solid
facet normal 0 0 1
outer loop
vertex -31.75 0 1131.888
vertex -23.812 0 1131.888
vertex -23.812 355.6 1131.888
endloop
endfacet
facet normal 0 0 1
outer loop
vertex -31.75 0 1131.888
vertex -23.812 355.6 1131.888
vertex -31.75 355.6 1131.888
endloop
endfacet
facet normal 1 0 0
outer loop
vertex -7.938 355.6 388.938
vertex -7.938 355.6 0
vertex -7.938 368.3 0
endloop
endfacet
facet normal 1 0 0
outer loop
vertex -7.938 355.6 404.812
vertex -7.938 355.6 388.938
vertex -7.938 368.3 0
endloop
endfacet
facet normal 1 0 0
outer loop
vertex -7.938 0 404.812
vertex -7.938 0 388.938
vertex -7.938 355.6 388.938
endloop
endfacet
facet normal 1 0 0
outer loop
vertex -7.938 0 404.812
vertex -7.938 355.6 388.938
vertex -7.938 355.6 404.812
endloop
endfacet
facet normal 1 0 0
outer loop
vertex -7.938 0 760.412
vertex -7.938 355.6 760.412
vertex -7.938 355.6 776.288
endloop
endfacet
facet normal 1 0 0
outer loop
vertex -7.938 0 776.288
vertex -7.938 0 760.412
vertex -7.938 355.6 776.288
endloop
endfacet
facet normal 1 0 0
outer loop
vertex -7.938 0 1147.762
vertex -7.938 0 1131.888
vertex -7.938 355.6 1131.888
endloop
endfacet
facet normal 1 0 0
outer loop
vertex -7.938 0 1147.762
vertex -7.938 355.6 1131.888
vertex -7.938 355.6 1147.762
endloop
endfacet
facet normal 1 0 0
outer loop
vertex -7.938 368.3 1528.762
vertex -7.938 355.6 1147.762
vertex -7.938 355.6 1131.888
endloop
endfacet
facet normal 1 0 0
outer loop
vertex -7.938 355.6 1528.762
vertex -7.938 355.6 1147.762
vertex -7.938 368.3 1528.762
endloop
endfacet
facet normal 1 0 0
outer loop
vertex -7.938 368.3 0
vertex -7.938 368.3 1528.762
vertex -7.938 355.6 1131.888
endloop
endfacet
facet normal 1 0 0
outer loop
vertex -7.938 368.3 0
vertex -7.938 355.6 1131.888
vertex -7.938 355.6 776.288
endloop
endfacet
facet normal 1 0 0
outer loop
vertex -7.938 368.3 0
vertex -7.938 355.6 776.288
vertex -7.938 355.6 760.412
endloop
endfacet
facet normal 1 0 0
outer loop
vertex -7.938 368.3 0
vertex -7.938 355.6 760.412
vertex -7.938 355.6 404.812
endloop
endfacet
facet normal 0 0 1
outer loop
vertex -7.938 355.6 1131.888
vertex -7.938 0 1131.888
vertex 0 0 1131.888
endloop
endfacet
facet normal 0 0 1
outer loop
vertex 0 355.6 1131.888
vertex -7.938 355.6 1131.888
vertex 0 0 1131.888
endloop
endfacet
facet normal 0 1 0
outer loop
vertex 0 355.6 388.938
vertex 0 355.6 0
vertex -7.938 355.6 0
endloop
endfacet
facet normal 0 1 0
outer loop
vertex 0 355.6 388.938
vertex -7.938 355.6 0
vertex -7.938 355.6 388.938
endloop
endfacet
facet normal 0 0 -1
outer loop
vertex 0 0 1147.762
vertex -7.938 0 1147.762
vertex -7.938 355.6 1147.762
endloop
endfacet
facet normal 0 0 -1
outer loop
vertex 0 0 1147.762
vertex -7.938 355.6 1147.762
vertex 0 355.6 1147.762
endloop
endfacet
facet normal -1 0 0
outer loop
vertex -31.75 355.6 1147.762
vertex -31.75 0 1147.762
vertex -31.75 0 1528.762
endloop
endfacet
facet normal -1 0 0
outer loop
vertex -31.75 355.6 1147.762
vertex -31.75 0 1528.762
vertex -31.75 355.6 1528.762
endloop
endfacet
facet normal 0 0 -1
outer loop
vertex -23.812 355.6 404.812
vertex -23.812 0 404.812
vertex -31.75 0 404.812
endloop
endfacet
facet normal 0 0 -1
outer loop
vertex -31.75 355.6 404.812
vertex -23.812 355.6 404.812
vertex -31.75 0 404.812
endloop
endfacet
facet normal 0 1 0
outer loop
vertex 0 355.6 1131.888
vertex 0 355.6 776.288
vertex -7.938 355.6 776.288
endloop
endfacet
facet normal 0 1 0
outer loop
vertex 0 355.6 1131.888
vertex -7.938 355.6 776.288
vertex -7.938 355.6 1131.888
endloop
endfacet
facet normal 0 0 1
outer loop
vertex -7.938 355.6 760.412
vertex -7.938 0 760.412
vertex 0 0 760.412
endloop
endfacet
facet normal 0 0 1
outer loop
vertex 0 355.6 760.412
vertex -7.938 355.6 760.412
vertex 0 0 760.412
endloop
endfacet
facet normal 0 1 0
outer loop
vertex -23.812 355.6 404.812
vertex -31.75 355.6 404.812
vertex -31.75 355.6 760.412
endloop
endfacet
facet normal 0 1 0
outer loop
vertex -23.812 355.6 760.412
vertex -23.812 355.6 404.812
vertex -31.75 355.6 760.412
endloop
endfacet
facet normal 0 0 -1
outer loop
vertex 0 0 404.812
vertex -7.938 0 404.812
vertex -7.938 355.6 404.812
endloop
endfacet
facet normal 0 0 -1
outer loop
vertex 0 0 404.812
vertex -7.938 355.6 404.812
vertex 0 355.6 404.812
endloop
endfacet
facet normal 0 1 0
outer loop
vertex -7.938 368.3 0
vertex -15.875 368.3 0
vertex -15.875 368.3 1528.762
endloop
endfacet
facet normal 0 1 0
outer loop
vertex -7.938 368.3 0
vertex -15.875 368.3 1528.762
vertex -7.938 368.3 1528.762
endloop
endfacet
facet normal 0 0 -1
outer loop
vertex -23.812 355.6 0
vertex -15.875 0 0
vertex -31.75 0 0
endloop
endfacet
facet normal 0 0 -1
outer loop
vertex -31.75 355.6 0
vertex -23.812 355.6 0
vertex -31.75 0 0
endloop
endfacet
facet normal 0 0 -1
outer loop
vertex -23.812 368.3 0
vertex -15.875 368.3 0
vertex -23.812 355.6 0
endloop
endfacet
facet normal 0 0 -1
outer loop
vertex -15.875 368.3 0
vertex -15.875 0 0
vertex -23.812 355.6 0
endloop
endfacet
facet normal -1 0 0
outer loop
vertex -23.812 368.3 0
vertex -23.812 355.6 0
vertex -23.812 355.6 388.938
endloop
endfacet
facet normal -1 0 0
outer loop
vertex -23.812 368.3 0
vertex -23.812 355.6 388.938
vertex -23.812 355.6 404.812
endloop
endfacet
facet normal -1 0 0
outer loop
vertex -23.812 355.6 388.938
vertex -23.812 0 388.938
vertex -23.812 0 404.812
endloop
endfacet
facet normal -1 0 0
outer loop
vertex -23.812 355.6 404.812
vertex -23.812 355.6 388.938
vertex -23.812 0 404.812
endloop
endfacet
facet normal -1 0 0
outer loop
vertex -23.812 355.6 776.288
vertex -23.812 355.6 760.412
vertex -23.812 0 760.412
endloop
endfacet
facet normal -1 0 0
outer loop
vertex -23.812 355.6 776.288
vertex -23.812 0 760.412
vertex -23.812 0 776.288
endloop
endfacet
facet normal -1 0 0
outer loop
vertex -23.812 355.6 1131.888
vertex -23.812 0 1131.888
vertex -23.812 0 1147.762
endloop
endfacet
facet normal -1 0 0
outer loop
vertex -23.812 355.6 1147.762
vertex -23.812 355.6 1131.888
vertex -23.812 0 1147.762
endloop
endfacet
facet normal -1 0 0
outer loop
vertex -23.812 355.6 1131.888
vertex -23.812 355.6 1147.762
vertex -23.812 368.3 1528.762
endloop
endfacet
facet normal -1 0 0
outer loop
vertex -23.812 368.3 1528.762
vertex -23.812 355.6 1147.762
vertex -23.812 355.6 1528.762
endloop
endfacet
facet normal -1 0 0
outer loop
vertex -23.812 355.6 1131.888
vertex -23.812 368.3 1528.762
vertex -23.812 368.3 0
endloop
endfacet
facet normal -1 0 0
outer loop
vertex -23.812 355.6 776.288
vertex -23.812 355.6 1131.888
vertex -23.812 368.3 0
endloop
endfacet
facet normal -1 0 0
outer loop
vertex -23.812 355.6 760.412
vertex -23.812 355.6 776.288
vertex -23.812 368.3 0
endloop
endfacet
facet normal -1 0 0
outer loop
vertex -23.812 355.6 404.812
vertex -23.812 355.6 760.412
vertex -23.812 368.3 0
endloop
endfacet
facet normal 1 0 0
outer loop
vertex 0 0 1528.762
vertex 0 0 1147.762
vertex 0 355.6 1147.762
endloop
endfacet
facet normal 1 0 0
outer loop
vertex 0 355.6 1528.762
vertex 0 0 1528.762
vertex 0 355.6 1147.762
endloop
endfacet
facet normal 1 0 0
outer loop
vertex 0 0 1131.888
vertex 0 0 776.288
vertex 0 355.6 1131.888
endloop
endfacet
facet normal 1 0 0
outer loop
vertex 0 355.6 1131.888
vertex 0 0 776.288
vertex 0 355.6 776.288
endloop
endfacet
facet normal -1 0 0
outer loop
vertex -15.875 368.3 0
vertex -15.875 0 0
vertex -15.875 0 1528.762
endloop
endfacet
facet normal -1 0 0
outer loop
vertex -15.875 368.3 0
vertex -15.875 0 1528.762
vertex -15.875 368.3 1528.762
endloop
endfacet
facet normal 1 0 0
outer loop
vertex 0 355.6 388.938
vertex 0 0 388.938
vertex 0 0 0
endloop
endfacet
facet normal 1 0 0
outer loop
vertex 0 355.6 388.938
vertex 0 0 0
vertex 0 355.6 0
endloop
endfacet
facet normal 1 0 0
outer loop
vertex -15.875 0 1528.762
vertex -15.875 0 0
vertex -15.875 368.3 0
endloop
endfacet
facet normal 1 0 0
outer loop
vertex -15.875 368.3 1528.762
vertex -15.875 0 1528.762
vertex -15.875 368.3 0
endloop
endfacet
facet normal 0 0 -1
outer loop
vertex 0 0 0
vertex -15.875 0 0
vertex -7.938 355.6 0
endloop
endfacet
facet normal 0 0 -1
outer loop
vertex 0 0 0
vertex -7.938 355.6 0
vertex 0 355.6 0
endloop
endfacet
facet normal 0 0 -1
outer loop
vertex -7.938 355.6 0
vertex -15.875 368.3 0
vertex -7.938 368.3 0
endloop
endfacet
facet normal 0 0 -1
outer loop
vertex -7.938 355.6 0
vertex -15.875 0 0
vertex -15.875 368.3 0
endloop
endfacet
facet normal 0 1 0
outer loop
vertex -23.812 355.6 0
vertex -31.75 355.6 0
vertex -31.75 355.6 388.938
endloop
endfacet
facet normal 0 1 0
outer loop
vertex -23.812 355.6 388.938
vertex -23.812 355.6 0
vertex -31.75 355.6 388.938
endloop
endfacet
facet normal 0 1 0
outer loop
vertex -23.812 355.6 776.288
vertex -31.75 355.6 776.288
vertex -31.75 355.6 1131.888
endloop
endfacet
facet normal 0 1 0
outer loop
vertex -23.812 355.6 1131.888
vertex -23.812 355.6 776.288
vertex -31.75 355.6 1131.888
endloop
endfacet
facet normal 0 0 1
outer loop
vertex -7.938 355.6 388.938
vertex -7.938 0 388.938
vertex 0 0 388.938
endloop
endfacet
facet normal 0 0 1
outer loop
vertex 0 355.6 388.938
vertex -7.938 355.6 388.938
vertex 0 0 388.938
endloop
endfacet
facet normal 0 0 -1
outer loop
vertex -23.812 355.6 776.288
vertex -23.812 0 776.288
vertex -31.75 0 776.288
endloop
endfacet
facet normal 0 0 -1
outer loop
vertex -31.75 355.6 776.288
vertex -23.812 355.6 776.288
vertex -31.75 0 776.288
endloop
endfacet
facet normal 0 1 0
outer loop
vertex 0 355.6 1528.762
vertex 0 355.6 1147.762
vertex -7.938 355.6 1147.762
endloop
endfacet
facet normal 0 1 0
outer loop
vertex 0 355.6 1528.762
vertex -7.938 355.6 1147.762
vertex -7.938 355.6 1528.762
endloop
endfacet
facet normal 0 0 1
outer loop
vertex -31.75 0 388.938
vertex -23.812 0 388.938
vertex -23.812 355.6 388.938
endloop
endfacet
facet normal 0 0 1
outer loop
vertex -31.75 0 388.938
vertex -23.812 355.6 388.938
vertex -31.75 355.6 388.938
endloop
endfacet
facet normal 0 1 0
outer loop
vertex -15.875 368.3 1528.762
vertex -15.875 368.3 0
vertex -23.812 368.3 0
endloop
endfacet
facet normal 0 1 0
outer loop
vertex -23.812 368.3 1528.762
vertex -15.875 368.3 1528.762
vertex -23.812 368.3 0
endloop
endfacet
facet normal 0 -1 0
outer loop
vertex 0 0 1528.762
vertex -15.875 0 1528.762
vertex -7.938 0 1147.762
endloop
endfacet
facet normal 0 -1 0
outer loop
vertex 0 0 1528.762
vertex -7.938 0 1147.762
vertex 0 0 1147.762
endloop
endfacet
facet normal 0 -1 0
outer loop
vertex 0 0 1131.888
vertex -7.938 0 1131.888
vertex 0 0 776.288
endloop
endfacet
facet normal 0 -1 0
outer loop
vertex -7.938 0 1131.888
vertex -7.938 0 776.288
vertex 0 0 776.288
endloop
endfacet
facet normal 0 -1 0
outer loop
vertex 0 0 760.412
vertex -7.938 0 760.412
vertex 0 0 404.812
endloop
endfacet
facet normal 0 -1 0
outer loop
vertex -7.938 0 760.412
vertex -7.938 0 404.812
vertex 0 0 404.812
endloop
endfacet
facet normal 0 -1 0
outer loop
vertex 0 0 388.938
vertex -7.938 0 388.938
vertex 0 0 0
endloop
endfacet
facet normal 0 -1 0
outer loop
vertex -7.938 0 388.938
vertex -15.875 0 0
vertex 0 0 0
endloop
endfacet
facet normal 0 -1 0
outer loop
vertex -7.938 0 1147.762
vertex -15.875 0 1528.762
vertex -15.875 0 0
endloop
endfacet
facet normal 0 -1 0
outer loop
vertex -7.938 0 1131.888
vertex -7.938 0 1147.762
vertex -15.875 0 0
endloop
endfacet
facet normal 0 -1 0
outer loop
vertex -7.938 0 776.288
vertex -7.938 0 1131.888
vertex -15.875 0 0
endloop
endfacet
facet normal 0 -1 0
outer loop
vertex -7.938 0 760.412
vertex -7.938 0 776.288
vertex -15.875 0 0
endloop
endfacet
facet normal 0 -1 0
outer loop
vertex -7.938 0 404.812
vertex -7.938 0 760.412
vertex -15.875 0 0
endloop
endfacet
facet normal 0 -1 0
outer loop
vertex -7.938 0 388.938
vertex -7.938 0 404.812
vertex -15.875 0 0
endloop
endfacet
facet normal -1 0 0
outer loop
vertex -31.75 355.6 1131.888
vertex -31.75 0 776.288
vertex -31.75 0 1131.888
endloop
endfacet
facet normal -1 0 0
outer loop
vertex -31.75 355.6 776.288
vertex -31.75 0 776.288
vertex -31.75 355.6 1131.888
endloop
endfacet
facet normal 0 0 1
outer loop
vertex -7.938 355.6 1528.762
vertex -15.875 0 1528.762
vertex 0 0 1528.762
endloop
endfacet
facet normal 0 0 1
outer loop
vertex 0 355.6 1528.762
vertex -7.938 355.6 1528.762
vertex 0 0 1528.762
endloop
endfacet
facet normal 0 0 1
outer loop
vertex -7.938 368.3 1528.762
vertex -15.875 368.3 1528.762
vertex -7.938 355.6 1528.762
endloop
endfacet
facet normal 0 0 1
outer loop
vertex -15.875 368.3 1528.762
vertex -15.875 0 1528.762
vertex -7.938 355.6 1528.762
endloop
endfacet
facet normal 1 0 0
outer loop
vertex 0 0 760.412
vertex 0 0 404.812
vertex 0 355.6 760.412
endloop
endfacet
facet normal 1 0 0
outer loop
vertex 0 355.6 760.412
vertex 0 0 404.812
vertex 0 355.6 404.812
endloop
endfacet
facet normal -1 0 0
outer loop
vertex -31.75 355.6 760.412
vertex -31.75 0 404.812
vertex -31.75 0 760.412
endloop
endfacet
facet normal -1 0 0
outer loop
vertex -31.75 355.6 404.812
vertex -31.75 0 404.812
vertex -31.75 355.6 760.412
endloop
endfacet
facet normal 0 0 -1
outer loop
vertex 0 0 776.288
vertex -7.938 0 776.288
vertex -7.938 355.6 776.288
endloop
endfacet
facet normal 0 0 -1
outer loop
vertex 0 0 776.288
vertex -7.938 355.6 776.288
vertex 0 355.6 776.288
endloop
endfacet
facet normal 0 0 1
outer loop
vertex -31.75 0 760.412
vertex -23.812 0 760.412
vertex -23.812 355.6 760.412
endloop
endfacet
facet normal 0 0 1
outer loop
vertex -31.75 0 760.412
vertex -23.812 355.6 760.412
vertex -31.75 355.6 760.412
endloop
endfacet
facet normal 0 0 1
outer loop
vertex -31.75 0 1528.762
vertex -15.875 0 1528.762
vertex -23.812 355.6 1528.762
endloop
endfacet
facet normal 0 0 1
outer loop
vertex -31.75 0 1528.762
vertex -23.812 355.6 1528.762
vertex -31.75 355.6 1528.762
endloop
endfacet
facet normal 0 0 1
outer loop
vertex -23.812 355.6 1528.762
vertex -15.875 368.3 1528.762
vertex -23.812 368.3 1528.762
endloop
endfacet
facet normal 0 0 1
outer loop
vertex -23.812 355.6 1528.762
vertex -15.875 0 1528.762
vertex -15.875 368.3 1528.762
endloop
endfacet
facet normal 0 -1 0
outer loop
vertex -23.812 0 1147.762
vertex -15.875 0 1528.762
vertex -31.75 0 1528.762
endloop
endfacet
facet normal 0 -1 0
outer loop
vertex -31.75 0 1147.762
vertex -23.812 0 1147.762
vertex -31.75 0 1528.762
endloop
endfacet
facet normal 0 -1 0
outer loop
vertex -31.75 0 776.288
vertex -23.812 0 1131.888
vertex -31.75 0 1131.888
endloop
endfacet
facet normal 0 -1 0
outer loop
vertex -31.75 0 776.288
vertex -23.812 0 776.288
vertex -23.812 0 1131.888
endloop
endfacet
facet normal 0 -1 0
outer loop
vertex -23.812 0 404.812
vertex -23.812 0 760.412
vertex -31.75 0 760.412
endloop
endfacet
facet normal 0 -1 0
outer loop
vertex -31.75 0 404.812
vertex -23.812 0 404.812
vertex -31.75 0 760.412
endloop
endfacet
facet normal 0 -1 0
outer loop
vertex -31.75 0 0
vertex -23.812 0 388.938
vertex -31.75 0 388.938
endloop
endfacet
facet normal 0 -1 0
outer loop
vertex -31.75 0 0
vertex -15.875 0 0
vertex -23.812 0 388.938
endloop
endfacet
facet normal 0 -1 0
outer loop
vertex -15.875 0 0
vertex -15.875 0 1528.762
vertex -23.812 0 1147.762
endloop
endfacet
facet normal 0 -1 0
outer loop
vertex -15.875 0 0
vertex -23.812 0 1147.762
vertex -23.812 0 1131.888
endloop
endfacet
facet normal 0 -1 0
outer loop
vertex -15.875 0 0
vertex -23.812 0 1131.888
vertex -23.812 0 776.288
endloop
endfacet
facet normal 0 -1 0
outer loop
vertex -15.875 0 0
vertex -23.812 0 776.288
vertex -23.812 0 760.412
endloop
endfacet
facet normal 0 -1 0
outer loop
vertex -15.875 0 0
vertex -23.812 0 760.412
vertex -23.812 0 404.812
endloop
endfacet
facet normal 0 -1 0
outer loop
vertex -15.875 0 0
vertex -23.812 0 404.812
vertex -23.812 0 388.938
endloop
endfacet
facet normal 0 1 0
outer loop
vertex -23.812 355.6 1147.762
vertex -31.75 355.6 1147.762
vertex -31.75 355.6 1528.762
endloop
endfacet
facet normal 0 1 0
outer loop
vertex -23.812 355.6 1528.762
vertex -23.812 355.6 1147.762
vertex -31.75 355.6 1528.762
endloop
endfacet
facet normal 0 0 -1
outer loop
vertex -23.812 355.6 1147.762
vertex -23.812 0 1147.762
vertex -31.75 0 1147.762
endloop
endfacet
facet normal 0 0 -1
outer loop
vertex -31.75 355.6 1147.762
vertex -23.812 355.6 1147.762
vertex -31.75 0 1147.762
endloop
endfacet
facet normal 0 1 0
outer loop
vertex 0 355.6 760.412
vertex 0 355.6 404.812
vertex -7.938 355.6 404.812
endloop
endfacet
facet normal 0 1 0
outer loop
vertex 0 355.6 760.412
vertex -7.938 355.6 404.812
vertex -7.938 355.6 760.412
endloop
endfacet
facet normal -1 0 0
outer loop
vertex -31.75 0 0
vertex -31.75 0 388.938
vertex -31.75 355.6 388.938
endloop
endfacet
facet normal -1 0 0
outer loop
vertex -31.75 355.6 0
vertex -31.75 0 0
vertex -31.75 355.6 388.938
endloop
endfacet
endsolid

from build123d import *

# Parameters (mm, degrees)
F0_W     = 15.875
F0_H     = 368.3
F1_DEPTH = 1528.7625
F2_W     = 7.9375
F2_H     = 15.875
F3_DEPTH = 368.3
F4_W     = 12.7
F4_H     = 1528.7625
F5_DEPTH = 7.9375


with BuildPart() as f1:
    # F0 (on Top) → F1 (new body)
    with BuildSketch(Plane.XY):
        with Locations((-7.9375, 184.15)):
            Rectangle(F0_W, F0_H)
    extrude(amount=F1_DEPTH)

    # F2 (on face) → F3 (cut, through all)
    with BuildSketch(Plane.XZ):
        with Locations((-3.96875, 396.875)):
            Rectangle(F2_W, F2_H)
        with Locations((-3.96875, 768.35)):
            Rectangle(F2_W, F2_H)
        with Locations((-3.96875, 1139.825)):
            Rectangle(F2_W, F2_H)
    extrude(amount=-F3_DEPTH, mode=Mode.SUBTRACT)

    # F4 (on face) → F5 (cut)
    with BuildSketch(Plane.YZ):
        with Locations((361.95, 764.38125)):
            Rectangle(F4_W, F4_H)
    extrude(amount=-F5_DEPTH, mode=Mode.SUBTRACT)


with BuildPart() as f6_1:
    # F6: instance of F1
    add(f1.part.mirror(Plane(origin=(-15.875, 184.15, 764.38125), x_dir=(0, -1, 0), z_dir=(-1, 0, 0))))


solid = Compound([f1.part, f6_1.part])
